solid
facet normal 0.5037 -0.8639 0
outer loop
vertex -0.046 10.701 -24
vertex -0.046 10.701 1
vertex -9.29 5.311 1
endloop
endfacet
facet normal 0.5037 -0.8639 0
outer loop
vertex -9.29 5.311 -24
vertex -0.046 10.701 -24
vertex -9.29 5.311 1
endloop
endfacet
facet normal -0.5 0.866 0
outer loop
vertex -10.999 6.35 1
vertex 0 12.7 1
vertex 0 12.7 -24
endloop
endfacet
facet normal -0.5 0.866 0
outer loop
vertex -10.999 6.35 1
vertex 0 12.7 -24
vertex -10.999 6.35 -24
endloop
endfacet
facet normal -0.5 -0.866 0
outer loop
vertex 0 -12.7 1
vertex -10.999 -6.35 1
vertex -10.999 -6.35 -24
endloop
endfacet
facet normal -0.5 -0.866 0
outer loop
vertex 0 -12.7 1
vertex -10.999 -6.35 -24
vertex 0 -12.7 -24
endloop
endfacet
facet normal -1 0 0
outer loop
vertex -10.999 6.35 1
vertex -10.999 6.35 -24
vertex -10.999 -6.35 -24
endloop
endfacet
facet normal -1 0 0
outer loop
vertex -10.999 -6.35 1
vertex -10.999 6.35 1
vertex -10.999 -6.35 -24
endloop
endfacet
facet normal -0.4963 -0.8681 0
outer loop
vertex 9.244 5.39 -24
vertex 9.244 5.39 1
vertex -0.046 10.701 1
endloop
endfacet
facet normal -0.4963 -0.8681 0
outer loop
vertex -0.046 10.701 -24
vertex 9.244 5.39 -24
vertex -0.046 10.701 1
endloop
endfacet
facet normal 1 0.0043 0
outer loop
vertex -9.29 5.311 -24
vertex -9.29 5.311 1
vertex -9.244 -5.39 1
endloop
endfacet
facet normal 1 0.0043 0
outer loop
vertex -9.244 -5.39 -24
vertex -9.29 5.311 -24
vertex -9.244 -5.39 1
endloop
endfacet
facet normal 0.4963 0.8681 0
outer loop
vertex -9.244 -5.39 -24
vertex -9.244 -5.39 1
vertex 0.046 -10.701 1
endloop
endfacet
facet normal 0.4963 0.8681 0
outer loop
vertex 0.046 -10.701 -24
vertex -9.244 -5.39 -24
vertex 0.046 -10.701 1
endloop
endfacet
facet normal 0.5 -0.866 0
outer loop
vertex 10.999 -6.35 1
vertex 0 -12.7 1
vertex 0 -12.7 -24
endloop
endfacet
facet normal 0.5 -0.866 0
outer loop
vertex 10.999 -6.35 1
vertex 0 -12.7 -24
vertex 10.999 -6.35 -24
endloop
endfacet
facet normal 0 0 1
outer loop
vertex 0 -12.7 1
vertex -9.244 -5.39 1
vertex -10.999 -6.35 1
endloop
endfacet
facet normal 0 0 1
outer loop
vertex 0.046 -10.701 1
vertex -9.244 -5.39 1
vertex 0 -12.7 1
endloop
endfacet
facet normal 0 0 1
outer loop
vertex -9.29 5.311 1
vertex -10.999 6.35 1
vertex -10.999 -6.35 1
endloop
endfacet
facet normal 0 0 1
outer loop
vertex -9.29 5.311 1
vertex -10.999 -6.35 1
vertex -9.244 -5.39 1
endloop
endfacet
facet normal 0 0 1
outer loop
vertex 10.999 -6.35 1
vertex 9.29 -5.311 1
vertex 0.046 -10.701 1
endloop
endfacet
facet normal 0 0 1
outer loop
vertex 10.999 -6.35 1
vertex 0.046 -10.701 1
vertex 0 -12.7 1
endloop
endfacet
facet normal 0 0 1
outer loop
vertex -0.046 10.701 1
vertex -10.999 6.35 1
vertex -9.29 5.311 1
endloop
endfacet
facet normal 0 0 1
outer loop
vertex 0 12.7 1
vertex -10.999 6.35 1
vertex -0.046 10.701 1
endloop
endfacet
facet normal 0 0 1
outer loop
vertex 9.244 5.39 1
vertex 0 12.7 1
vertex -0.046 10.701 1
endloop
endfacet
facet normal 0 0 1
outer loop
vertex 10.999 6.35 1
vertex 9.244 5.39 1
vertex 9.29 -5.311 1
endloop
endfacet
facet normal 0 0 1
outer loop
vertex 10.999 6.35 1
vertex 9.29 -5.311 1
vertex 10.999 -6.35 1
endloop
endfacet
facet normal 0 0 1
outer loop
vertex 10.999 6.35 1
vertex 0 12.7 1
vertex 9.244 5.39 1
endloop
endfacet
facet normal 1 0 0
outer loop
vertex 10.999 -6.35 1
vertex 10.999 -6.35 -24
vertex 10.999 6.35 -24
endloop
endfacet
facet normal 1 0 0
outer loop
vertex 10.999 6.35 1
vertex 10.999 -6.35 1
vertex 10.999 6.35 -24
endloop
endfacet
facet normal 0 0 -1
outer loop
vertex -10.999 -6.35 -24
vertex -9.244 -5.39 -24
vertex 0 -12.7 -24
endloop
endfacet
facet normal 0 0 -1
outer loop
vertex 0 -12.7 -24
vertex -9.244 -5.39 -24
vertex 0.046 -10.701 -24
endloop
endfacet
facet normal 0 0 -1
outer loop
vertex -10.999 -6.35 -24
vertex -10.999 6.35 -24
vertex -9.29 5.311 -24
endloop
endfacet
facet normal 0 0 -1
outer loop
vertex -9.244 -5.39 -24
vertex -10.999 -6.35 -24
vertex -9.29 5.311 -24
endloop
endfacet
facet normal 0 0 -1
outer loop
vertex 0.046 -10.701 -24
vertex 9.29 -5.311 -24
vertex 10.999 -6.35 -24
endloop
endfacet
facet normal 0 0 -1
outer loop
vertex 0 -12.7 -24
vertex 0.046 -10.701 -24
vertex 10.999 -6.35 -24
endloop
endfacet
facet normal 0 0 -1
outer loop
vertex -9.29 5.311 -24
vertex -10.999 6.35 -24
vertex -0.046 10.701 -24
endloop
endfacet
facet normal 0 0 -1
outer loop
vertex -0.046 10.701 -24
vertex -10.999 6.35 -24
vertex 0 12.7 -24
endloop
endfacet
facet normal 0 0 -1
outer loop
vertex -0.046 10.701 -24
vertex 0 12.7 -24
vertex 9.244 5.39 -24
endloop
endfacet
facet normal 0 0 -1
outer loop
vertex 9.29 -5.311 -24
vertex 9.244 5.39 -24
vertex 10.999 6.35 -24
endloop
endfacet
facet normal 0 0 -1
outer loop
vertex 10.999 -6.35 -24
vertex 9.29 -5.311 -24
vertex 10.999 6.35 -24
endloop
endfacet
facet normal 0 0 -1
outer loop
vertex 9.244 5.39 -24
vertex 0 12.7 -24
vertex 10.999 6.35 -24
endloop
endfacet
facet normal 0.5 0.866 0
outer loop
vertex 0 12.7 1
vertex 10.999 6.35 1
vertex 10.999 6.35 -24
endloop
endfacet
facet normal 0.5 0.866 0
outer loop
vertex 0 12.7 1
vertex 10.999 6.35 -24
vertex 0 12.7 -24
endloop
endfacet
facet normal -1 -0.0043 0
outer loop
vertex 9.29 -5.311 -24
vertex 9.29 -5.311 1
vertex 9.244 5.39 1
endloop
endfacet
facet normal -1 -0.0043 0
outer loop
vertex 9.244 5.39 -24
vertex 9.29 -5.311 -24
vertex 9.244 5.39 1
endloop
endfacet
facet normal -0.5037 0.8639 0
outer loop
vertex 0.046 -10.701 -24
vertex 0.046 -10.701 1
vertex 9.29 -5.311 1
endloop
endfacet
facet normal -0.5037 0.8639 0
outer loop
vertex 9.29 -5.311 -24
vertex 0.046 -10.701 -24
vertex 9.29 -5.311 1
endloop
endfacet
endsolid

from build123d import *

# Parameters (mm, degrees)
F1_DEPTH = 1
F3_DEPTH = 1
F5_DEPTH = 25.0000003725


with BuildPart() as f1:
    # F0 (on Top) → F1 (new body)
    with BuildSketch(Plane.XY):
        Polygon((10.9985226281, 6.35), (0, 12.7), (-10.9985226281, 6.35), (-10.9985226281, -6.35), (0, -12.7), (10.9985226281, -6.35), align=None)
    extrude(amount=F1_DEPTH)

    # F2 (on Top) → F3 (cut)
    with BuildSketch(Plane.XY):
        Polygon((9.2440988936, 5.389793064), (-0.0456482678, 10.7005210089), (-9.2897471614, 5.310727945), (-9.2440988936, -5.389793064), (0.0456482678, -10.7005210089), (9.2897471614, -5.310727945), align=None)
    extrude(amount=F3_DEPTH, mode=Mode.SUBTRACT)

    # F5 (add): a face of the model
    f5_faces = [f1.faces().sort_by_distance(p)[0] for p in [
        (5.3312561058, 9.2340064434, 1),
    ]]
    extrude(f5_faces, amount=-F5_DEPTH)


solid = f1.part
